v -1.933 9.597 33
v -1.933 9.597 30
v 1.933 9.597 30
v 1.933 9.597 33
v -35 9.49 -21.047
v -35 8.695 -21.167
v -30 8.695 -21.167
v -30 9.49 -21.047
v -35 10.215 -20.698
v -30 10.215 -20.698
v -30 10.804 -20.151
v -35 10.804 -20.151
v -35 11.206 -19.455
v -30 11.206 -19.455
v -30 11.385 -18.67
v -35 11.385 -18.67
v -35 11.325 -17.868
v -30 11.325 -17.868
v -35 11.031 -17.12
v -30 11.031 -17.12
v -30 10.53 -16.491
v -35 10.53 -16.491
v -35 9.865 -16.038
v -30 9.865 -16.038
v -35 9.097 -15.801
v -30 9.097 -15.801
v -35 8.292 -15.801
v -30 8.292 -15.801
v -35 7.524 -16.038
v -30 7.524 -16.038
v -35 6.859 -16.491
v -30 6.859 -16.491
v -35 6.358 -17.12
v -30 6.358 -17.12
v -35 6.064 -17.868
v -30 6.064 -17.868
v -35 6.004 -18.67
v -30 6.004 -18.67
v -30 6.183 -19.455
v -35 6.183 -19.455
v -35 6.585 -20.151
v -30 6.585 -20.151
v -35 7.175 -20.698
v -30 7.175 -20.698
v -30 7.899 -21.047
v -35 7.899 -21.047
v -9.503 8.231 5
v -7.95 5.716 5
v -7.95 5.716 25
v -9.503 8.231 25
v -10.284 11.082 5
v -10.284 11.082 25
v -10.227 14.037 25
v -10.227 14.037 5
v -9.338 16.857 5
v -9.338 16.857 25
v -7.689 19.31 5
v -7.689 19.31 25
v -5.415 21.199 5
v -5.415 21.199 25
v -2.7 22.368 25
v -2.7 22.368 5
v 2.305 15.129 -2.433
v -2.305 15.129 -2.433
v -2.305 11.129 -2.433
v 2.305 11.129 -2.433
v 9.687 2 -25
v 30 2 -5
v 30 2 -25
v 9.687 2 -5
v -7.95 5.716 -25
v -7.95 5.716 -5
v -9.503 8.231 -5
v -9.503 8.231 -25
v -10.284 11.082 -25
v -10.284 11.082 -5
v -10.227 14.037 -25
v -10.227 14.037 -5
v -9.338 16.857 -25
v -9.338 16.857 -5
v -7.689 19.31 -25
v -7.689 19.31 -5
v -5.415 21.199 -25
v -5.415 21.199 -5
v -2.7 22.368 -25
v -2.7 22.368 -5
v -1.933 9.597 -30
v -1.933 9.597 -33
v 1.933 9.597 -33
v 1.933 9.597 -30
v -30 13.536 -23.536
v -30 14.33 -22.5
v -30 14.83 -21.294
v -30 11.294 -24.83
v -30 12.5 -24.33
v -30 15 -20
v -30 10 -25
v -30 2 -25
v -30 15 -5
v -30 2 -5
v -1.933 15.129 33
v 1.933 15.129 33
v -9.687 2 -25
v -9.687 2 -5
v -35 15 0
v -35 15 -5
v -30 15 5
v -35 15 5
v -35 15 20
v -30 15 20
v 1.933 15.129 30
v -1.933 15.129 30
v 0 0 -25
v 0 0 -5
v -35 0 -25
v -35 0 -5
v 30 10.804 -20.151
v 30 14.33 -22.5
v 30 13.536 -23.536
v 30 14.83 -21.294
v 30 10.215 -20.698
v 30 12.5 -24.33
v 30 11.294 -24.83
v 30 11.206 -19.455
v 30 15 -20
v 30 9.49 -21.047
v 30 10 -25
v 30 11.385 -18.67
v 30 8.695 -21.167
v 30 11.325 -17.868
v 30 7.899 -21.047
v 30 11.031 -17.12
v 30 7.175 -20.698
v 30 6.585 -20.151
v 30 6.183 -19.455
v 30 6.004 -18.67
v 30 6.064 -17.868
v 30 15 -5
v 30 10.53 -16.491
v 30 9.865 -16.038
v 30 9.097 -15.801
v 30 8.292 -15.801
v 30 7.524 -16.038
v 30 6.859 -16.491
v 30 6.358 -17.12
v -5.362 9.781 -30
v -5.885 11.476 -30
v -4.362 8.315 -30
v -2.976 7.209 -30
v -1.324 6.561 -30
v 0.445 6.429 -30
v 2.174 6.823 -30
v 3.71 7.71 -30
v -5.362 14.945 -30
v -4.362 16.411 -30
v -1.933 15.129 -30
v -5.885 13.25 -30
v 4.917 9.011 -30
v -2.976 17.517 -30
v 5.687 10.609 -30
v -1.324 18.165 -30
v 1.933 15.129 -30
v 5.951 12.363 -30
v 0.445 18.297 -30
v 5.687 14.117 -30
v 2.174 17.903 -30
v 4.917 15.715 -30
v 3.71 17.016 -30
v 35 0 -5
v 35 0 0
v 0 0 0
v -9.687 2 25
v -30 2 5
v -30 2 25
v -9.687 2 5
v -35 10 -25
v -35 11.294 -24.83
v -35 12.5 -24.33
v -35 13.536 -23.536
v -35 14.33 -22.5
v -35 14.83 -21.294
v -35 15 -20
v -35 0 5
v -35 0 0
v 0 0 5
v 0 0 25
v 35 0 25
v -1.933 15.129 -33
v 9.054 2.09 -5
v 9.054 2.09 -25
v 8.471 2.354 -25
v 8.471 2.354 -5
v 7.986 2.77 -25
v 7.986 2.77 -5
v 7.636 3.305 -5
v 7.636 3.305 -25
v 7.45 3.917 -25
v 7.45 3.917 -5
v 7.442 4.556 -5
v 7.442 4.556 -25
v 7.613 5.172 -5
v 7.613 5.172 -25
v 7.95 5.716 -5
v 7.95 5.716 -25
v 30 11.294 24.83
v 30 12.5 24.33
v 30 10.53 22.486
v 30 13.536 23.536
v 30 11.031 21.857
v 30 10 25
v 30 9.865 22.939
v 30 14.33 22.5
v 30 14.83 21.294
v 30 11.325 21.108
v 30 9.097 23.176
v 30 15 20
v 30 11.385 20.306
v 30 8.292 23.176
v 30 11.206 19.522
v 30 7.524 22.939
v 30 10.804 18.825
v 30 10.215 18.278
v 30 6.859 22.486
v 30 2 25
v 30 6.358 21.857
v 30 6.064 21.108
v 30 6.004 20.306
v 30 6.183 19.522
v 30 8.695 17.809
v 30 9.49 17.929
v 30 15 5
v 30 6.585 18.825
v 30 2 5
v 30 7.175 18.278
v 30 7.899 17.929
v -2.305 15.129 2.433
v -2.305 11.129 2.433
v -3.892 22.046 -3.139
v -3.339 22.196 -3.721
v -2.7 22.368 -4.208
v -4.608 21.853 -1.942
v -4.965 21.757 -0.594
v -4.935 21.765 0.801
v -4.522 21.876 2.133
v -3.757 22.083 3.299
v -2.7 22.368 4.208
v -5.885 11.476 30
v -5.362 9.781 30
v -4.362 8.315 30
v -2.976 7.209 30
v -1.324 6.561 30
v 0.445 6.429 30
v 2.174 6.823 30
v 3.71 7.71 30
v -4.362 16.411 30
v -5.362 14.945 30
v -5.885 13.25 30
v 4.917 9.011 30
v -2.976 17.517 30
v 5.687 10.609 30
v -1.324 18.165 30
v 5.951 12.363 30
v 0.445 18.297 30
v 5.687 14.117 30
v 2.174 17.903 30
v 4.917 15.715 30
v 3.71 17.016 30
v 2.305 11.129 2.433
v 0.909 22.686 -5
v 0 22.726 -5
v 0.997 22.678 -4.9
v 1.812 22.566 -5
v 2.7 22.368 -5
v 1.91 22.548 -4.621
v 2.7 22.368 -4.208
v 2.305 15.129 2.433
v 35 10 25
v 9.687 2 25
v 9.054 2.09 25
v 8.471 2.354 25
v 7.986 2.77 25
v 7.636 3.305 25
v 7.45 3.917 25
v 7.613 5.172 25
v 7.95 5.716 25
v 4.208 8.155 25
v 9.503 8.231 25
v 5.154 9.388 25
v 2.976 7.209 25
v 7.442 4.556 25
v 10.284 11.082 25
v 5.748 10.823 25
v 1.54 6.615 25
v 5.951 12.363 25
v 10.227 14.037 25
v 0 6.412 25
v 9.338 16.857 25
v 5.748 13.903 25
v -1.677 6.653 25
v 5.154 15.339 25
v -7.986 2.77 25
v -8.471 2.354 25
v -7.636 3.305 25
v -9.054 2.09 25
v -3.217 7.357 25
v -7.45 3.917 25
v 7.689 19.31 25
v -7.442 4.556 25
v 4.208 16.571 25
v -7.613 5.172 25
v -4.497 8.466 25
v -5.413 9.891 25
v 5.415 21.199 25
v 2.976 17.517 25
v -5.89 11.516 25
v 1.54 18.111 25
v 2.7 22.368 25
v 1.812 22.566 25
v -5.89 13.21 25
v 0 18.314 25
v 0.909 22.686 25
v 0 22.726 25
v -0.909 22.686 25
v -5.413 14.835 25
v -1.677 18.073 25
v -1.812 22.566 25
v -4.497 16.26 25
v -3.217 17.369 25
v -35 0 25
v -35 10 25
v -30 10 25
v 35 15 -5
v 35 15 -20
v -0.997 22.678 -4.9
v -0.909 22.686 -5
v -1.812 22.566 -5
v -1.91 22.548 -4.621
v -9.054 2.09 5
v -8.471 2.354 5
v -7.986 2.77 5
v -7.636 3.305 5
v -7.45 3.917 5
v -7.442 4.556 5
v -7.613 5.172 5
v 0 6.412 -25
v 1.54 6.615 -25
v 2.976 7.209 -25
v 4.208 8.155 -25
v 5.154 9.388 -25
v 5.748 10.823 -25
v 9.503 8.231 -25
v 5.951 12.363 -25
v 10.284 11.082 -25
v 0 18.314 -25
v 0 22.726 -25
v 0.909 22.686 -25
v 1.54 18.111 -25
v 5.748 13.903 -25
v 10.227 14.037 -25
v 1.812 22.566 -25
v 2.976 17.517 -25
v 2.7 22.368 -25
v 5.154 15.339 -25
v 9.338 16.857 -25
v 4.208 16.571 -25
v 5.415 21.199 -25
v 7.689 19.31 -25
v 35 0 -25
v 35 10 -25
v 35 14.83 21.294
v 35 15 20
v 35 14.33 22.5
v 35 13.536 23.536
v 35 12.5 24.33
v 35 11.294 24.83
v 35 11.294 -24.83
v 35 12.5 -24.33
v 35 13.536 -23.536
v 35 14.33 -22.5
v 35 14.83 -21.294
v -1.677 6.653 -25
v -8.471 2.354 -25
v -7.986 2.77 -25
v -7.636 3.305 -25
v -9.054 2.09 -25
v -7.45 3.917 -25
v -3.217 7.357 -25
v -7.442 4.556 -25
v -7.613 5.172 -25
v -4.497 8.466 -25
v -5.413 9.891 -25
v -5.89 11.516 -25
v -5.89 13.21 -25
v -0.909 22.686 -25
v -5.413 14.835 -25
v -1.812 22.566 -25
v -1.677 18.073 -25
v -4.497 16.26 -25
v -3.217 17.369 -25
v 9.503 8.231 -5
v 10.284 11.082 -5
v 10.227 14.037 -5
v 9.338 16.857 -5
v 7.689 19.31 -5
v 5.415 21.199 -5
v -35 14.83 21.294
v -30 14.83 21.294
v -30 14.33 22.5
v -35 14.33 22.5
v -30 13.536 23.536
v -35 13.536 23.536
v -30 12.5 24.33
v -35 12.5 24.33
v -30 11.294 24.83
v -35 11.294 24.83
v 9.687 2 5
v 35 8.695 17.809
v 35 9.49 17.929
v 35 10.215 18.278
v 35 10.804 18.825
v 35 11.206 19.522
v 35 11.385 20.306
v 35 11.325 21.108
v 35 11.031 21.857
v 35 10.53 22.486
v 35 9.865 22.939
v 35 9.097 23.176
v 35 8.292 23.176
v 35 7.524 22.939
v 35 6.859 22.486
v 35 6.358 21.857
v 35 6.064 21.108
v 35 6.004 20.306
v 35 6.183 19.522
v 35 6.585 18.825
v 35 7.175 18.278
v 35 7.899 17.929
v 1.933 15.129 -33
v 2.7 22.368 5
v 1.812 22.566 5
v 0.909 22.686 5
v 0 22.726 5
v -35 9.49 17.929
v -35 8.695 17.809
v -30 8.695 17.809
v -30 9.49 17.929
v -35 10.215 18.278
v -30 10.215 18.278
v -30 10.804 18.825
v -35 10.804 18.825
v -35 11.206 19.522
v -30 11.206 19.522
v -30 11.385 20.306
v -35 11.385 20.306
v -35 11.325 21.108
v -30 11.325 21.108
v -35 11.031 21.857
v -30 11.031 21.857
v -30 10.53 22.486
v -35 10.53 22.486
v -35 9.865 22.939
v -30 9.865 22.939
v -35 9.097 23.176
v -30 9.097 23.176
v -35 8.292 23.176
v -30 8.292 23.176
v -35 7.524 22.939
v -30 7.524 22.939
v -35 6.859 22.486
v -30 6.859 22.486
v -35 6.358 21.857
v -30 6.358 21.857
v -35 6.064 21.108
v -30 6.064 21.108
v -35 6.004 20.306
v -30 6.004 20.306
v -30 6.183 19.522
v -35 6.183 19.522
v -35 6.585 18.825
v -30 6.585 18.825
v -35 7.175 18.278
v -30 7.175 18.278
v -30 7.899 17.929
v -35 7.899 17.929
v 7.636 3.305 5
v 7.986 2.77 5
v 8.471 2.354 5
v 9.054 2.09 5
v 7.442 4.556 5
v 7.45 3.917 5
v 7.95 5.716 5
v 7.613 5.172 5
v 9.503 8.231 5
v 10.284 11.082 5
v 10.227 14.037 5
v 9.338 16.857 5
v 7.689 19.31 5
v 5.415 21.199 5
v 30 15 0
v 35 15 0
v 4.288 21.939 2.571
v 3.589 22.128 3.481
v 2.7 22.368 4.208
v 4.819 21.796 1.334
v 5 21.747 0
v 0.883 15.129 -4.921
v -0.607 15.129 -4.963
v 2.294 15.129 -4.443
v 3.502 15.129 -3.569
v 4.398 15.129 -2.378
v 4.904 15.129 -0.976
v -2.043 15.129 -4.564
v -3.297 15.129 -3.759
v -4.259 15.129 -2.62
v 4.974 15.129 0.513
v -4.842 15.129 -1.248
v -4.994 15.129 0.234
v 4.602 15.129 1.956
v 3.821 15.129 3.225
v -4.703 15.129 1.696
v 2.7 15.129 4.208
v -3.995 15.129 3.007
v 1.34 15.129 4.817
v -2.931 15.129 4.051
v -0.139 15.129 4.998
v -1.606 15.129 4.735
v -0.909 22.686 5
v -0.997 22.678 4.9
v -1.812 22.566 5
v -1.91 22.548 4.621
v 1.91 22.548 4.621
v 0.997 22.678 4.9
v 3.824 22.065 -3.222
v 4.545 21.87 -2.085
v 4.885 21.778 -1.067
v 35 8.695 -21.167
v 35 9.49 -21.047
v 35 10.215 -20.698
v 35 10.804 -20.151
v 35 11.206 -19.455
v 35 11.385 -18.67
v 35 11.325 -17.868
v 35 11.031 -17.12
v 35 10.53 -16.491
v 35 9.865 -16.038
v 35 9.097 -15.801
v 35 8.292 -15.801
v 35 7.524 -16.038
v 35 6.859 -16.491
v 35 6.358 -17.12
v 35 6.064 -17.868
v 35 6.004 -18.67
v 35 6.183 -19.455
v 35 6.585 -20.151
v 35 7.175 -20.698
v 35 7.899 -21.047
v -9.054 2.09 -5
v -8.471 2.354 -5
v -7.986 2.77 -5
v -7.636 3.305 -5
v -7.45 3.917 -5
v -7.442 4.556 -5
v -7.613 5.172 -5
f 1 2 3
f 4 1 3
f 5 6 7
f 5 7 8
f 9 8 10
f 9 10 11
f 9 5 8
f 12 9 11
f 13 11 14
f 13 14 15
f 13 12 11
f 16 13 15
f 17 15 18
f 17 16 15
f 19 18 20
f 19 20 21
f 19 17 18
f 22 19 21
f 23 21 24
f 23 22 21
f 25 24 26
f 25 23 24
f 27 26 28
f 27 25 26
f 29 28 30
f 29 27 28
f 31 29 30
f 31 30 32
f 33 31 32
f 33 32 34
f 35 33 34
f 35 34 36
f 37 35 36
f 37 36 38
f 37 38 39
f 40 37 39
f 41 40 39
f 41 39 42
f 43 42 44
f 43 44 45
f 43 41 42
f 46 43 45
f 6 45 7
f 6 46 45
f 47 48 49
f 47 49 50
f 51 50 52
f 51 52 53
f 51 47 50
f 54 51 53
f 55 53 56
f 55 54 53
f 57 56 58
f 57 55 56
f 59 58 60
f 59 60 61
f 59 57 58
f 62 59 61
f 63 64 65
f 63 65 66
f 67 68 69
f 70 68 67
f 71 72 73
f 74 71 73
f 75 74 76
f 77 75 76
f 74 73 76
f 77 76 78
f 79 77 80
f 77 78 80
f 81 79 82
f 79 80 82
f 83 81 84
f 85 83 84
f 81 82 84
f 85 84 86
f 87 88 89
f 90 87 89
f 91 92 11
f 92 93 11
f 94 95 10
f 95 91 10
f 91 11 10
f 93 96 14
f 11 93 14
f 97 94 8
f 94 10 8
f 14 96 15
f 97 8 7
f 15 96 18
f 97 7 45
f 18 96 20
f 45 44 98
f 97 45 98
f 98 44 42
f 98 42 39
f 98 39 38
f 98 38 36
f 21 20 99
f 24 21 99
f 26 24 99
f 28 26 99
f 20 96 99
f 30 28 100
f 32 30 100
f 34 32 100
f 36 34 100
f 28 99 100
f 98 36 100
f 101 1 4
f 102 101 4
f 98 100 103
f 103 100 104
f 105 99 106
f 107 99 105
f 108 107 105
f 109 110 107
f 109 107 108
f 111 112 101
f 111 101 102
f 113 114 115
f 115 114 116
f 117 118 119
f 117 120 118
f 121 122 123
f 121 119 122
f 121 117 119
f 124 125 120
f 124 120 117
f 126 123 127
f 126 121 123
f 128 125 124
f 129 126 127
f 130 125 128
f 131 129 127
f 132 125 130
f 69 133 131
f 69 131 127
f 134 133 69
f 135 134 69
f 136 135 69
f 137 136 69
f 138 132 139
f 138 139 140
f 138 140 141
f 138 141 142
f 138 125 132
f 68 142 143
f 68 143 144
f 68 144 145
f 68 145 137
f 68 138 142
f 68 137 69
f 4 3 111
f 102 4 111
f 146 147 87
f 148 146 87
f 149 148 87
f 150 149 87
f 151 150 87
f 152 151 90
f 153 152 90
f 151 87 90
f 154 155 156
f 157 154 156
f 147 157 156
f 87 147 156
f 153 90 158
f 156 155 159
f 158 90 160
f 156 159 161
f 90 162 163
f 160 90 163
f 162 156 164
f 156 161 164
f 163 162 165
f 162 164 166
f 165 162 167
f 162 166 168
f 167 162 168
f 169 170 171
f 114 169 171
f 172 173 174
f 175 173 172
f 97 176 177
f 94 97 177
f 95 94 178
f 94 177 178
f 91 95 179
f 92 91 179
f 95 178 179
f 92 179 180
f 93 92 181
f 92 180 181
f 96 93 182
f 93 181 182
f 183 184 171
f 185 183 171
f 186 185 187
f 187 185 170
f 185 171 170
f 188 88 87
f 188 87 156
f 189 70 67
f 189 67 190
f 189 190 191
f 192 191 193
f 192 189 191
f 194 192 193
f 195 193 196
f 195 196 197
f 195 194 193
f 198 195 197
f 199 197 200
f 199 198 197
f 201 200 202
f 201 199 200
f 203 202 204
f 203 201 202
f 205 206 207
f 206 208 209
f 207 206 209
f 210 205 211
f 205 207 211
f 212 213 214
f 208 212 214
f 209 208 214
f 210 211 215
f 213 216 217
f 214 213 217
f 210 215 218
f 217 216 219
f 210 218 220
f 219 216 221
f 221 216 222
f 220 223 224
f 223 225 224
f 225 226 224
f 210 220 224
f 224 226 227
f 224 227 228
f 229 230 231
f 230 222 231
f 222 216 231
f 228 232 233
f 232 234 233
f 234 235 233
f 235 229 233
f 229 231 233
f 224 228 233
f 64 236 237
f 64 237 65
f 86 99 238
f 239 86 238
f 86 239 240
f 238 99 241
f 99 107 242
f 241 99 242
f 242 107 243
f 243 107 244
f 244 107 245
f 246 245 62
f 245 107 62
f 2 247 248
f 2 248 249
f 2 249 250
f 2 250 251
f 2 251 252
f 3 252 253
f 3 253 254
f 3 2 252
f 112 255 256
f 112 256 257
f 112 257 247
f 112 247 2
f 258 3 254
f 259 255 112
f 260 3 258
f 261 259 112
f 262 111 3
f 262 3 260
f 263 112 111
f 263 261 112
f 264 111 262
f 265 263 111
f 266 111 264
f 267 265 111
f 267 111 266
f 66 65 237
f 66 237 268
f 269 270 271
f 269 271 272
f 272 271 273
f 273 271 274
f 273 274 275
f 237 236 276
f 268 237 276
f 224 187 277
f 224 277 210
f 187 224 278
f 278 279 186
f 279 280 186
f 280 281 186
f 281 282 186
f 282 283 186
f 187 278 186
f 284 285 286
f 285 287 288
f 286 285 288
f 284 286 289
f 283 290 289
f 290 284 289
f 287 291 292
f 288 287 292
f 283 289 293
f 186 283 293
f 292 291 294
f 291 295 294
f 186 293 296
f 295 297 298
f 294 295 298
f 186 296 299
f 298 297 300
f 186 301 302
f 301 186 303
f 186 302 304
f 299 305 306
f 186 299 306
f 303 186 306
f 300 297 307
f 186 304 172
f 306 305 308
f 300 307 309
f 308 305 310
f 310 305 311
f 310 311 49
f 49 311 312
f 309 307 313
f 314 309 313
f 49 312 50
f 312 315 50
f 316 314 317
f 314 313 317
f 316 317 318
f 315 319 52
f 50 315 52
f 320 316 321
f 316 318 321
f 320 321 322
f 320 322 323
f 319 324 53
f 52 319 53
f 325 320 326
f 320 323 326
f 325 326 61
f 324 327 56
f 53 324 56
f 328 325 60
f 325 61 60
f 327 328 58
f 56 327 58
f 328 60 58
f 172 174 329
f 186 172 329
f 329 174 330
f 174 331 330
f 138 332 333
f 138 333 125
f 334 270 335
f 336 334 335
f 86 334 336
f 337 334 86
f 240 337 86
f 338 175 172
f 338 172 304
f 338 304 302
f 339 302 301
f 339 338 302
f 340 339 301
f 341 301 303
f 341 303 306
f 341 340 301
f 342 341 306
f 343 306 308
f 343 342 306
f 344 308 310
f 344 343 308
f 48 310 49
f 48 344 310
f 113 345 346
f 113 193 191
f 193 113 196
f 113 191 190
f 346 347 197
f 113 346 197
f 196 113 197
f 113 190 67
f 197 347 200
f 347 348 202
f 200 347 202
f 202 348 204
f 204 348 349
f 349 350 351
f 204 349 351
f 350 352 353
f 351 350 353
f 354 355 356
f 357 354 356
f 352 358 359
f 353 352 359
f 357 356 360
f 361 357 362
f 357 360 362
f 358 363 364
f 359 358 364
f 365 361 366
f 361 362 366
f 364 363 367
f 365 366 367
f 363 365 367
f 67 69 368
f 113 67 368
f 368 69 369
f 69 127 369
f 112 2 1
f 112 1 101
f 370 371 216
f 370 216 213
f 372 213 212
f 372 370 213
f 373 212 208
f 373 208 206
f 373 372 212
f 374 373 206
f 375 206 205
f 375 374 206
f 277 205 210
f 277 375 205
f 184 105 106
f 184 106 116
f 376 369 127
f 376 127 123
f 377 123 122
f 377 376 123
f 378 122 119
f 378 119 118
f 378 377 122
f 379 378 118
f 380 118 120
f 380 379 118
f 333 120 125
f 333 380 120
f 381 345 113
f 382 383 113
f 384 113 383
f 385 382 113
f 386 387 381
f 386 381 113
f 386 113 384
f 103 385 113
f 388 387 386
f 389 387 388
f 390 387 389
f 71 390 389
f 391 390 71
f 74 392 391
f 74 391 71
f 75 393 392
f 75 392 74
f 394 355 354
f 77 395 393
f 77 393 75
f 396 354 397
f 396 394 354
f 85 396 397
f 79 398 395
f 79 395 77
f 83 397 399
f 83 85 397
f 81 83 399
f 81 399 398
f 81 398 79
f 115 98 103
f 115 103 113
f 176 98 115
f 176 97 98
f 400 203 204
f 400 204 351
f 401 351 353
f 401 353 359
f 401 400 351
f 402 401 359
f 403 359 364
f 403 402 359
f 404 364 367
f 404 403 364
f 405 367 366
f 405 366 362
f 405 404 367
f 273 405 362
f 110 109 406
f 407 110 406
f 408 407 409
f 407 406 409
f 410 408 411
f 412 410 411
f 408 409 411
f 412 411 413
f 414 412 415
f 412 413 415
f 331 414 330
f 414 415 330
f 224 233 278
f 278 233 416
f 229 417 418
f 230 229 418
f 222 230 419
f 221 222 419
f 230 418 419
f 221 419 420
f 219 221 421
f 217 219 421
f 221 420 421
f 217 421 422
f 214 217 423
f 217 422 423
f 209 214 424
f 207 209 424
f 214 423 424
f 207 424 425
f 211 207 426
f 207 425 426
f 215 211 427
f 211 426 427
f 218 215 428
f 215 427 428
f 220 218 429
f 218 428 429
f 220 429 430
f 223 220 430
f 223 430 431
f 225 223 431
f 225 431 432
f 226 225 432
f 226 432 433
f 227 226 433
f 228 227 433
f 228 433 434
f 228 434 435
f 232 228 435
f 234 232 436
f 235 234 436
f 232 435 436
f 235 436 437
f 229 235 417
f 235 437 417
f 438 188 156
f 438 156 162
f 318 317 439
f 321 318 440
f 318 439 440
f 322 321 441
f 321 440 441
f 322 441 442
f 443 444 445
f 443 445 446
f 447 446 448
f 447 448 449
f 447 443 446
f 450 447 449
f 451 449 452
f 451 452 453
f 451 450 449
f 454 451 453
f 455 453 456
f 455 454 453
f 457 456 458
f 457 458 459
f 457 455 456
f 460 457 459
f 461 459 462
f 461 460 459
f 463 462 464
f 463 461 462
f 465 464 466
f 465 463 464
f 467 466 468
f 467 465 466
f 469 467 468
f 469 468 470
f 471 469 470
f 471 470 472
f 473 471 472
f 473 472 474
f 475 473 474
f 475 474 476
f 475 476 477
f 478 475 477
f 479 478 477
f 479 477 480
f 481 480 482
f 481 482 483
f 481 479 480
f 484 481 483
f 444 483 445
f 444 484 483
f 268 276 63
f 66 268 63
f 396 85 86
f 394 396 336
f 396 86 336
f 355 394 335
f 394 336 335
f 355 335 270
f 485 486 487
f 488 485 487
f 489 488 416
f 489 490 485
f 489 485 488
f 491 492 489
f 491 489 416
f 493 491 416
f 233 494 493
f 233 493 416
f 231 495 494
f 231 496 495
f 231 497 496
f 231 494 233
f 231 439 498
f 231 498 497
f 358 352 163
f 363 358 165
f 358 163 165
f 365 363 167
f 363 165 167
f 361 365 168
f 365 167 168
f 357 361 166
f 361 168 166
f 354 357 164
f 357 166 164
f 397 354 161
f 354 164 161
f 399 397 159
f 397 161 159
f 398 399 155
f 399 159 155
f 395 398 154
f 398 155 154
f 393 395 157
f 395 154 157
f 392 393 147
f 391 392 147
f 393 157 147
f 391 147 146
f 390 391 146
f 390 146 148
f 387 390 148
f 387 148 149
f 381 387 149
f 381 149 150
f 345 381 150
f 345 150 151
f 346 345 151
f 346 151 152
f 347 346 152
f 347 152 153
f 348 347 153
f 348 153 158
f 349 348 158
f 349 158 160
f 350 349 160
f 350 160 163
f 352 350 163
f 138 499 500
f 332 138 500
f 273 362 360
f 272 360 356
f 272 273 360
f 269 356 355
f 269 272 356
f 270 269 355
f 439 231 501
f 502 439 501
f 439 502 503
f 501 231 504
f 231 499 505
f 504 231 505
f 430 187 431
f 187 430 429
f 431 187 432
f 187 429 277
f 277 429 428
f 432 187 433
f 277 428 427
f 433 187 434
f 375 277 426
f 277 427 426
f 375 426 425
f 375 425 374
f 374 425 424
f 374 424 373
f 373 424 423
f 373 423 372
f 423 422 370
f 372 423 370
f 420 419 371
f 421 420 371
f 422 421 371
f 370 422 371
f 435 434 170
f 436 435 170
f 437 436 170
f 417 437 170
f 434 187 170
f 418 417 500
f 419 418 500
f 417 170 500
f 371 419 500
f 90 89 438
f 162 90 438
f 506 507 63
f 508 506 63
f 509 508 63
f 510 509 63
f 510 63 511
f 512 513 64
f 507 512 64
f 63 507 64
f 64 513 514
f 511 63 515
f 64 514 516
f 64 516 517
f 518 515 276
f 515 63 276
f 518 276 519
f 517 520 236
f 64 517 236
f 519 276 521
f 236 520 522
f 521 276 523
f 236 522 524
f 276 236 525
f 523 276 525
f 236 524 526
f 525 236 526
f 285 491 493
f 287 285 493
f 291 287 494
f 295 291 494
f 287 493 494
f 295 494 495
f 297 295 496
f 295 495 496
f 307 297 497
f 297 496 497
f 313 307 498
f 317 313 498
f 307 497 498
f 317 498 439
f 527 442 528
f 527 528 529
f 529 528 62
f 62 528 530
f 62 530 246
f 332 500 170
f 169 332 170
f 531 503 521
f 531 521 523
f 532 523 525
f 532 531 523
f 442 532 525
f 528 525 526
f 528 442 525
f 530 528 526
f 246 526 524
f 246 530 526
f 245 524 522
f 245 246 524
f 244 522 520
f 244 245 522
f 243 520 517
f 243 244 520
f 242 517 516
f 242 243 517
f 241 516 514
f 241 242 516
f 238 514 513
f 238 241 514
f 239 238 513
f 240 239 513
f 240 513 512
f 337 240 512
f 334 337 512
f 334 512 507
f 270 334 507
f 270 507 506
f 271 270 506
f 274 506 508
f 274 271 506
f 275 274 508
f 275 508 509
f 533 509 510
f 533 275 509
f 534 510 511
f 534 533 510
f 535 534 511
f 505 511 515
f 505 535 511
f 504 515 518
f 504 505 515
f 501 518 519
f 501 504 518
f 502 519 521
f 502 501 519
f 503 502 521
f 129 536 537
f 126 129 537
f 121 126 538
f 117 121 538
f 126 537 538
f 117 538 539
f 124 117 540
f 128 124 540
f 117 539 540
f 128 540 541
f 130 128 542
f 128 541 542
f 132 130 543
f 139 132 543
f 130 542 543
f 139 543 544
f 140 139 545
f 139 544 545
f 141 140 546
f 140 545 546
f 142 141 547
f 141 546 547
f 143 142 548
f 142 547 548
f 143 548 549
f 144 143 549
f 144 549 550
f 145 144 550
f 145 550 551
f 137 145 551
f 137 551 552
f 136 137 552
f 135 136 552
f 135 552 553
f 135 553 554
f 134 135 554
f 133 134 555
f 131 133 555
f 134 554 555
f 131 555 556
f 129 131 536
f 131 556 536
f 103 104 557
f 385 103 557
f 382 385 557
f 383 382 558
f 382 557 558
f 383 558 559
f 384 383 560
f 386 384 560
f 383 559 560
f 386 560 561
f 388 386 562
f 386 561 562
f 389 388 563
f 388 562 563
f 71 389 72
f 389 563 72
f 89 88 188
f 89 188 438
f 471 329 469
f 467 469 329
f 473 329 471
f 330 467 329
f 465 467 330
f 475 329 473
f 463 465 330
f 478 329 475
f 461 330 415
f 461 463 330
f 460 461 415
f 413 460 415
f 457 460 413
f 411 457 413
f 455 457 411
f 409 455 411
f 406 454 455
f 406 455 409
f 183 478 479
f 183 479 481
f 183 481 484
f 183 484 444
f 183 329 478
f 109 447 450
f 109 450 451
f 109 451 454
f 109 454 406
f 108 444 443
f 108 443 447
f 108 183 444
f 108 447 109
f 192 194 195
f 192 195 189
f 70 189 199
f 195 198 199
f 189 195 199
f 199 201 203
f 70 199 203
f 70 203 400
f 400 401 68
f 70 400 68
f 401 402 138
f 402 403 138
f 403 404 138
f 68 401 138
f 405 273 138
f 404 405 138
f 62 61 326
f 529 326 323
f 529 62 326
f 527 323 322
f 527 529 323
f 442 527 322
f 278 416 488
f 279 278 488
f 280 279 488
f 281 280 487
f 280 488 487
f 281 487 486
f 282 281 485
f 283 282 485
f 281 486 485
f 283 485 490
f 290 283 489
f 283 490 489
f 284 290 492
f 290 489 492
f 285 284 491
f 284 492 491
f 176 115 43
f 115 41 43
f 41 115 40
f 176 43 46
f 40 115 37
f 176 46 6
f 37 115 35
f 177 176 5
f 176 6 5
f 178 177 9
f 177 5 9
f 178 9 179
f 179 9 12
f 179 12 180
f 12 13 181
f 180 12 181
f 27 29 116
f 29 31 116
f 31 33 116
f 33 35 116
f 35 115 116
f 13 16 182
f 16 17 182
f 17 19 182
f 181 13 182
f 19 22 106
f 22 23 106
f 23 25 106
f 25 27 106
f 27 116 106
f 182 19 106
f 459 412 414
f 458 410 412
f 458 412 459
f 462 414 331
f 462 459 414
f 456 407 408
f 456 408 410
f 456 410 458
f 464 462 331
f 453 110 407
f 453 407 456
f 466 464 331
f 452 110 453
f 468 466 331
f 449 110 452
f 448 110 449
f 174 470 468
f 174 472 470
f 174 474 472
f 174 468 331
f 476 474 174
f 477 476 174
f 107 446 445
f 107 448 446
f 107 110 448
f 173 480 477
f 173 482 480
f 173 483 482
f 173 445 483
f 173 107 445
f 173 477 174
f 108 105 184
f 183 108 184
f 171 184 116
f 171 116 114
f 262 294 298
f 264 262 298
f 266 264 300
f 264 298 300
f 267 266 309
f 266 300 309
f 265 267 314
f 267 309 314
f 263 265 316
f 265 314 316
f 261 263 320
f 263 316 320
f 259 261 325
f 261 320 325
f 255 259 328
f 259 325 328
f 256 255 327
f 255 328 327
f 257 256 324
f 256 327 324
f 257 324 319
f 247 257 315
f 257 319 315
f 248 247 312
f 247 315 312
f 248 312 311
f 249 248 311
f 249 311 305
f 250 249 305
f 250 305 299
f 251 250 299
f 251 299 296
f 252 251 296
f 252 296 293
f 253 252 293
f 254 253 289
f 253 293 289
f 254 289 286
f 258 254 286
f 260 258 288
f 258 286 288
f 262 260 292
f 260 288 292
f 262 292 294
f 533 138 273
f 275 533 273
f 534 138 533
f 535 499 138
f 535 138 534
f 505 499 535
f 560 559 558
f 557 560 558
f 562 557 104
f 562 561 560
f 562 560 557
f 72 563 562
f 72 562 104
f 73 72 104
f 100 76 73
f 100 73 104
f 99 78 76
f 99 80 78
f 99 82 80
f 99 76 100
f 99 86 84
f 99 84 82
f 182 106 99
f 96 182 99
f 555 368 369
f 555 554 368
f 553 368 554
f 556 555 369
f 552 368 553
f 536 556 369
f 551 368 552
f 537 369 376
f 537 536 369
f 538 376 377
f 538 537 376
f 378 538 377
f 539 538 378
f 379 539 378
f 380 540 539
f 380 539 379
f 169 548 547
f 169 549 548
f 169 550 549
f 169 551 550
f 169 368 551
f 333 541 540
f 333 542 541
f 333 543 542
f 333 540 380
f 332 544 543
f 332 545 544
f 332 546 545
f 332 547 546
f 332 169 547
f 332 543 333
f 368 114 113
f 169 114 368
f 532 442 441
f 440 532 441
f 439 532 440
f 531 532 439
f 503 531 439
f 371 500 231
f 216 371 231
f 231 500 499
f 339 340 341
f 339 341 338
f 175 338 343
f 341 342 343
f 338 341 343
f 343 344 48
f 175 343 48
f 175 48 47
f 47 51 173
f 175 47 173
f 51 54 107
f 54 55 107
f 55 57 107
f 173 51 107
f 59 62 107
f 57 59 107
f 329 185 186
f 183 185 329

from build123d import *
from build123d.topology import SkipClean

# Parameters (mm, degrees)
BOSS_EXTRUDE1_DEPTH      = 5
BOSS_EXTRUDE2_DEPTH      = 20
MIRROR3_COPY_1_DEPTH     = 5
MIRROR3_COPY_2_DEPTH     = 20
SKETCH4_R                = 2.698355907
CUT_EXTRUDE1_DEPTH       = 5
BOSS_EXTRUDE3_DEPTH      = 5
BOSS_EXTRUDE3_DEPTH_BACK = 55
SKETCH8_R                = 5.951026126
SKETCH8_W                = 3.866122338
SKETCH8_H                = 5.532358837
BOSS_EXTRUDE5_DEPTH      = 3
BOSS_EXTRUDE5_DEPTH_BACK = 63
SKETCH10_W               = 3.866122338
SKETCH10_H               = 5.532358837
SKETCH12_R               = 5
CUT_EXTRUDE3_DEPTH       = 7.59683428
SKETCH14_W               = 4.609426796
SKETCH14_H               = 4.865506062
CUT_EXTRUDE6_DEPTH       = 4


with BuildPart() as part:
    # Sketch1 → Boss-Extrude1 (new body)
    with BuildSketch(Plane.XY):
        with BuildLine():
            Line((30, 2), (30, 15))
            Line((30, 15), (2.700298335, 22.368034529))
            ThreePointArc((2.700298335, 22.368034529), (9.883500212, 15.478856519), (7.950094011, 5.715603818))
            ThreePointArc((7.950094011, 5.715603818), (7.635951646, 3.305180914), (9.686640989, 2))
            Line((9.686640989, 2), (30, 2))
        make_face()
        with BuildLine():
            ThreePointArc((7.950094011, 5.715603818), (7.635951646, 3.305180914), (9.686640989, 2))
            Line((9.686640989, 2), (30, 2))
            Line((30, 2), (30, 15))
            Line((30, 15), (35, 15))
            Line((35, 15), (35, 0))
            Line((35, 0), (0, 0))
            Line((0, 0), (0, 2))
            Line((0, 2), (0, 6.411987573))
            ThreePointArc((0, 6.411987573), (5.951026126, 12.363013699), (0, 18.314039825))
            Line((0, 18.314039825), (0, 22.726027397))
            ThreePointArc((0, 22.726027397), (9.388270676, 16.750772424), (7.950094011, 5.715603818))
        make_face()
    boss_extrude1 = extrude(amount=BOSS_EXTRUDE1_DEPTH)

    # Sketch3 → Boss-Extrude2 (add)
    with BuildSketch(Plane.XY.offset(5)):
        with BuildLine():
            ThreePointArc((7.950094011, 5.715603818), (9.883500212, 15.478856519), (2.700298335, 22.368034529))
            ThreePointArc((2.700298335, 22.368034529), (1.361962737, 22.636139339), (0, 22.726027397))
            Line((0, 22.726027397), (0, 18.314039825))
            ThreePointArc((0, 18.314039825), (5.951026126, 12.363013699), (0, 6.411987573))
            Line((0, 6.411987573), (0, 2))
            Line((0, 2), (0, 0))
            Line((0, 0), (35, 0))
            Line((35, 0), (35, 15))
            Line((35, 15), (30, 15))
            Line((30, 15), (30, 2))
            Line((30, 2), (9.686640989, 2))
            ThreePointArc((9.686640989, 2), (7.635951646, 3.305180914), (7.950094011, 5.715603818))
        make_face()
    boss_extrude2 = extrude(amount=BOSS_EXTRUDE2_DEPTH)

    # Mirror2: Boss-Extrude1, Boss-Extrude2 across plane
    add(boss_extrude1.mirror(Plane.ZY))
    add(boss_extrude2.mirror(Plane.ZY))

    # Mirror3: Boss-Extrude1, Boss-Extrude2 across Front Plane
    with SkipClean():  # the faces are left unmerged after this step: merging them gives an invalid solid
        add(boss_extrude1.mirror(Plane.XY))
        add(boss_extrude2.mirror(Plane.XY))

    # Mirror3 copy 1 sketch → Mirror3 copy 1 (add)
    with BuildSketch(Plane(origin=(0, 0, 0), x_dir=(-1, 0, 0), z_dir=(0, 0, -1))):
        with BuildLine():
            Line((30, 2), (30, 15))
            Line((30, 15), (2.700298335, 22.368034529))
            ThreePointArc((2.700298335, 22.368034529), (9.883500212, 15.478856519), (7.950094011, 5.715603818))
            ThreePointArc((7.950094011, 5.715603818), (7.635951646, 3.305180914), (9.686640989, 2))
            Line((9.686640989, 2), (30, 2))
        make_face()
        with BuildLine():
            ThreePointArc((7.950094011, 5.715603818), (7.635951646, 3.305180914), (9.686640989, 2))
            Line((9.686640989, 2), (30, 2))
            Line((30, 2), (30, 15))
            Line((30, 15), (35, 15))
            Line((35, 15), (35, 0))
            Line((35, 0), (0, 0))
            Line((0, 0), (0, 2))
            Line((0, 2), (0, 6.411987573))
            ThreePointArc((0, 6.411987573), (5.951026126, 12.363013699), (0, 18.314039825))
            Line((0, 18.314039825), (0, 22.726027397))
            ThreePointArc((0, 22.726027397), (9.388270676, 16.750772424), (7.950094011, 5.715603818))
        make_face()
    extrude(amount=MIRROR3_COPY_1_DEPTH)

    # Mirror3 copy 2 sketch → Mirror3 copy 2 (add)
    with SkipClean():  # the faces are left unmerged after this step: merging them gives an invalid solid
        with BuildSketch(Plane(origin=(0, 0, -5), x_dir=(-1, 0, 0), z_dir=(0, 0, -1))):
            with BuildLine():
                ThreePointArc((7.950094011, 5.715603818), (9.883500212, 15.478856519), (2.700298335, 22.368034529))
                ThreePointArc((2.700298335, 22.368034529), (1.361962737, 22.636139339), (0, 22.726027397))
                Line((0, 22.726027397), (0, 18.314039825))
                ThreePointArc((0, 18.314039825), (5.951026126, 12.363013699), (0, 6.411987573))
                Line((0, 6.411987573), (0, 2))
                Line((0, 2), (0, 0))
                Line((0, 0), (35, 0))
                Line((35, 0), (35, 15))
                Line((35, 15), (30, 15))
                Line((30, 15), (30, 2))
                Line((30, 2), (9.686640989, 2))
                ThreePointArc((9.686640989, 2), (7.635951646, 3.305180914), (7.950094011, 5.715603818))
            make_face()
        extrude(amount=MIRROR3_COPY_2_DEPTH)

    # Sketch4 → Cut-Extrude1 (cut)
    with SkipClean():  # the faces are left unmerged after this step: merging them gives an invalid solid
        with BuildSketch(Plane(origin=(35, 0, 0), x_dir=(0, 0, -1), z_dir=(1, 0, 0))):
            with Locations((-20.507504892, 8.694639524)):
                Circle(SKETCH4_R)
            with Locations((18.468747096, 8.694639524)):
                Circle(SKETCH4_R)
            with BuildLine():
                Line((-25, 10), (-27.403303321, 11.153141573))
                Line((-27.403303321, 11.153141573), (-26.20165166, 17.389341891))
                Line((-26.20165166, 17.389341891), (-20, 16.194347401))
                Line((-20, 16.194347401), (-20, 15))
                ThreePointArc((-20, 15), (-23.535533906, 13.535533906), (-25, 10))
            make_face()
            with BuildLine():
                Line((20, 15), (20.74735875, 17.389341891))
                Line((20.74735875, 17.389341891), (31.360891984, 16.194670945))
                Line((31.360891984, 16.194670945), (27.103485998, 9.174347241))
                Line((27.103485998, 9.174347241), (25, 10))
                ThreePointArc((25, 10), (23.535533906, 13.535533906), (20, 15))
            make_face()
        cut_extrude1 = extrude(amount=-CUT_EXTRUDE1_DEPTH, mode=Mode.SUBTRACT)

    # Mirror4: Cut-Extrude1 across plane
    with SkipClean():  # the faces are left unmerged after this step: merging them gives an invalid solid
        add(cut_extrude1.mirror(Plane.ZY), mode=Mode.SUBTRACT)

    # Sketch8 → Boss-Extrude3 (add, two sides: drawn at the far end of the back side and taken through both)
    with SkipClean():  # the faces are left unmerged after this step: merging them gives an invalid solid
        with BuildSketch(Plane.XY.offset(25).offset(-BOSS_EXTRUDE3_DEPTH_BACK)):
            with Locations((0, 12.363013699)):
                Circle(SKETCH8_R)
            with Locations((0, 12.363013699)):
                Rectangle(SKETCH8_W, SKETCH8_H, mode=Mode.SUBTRACT)
        extrude(amount=BOSS_EXTRUDE3_DEPTH + BOSS_EXTRUDE3_DEPTH_BACK)

    # Sketch10 → Boss-Extrude5 (add, two sides: drawn at the far end of the back side and taken through both)
    with SkipClean():  # the faces are left unmerged after this step: merging them gives an invalid solid
        with BuildSketch(Plane.XY.offset(30).offset(-BOSS_EXTRUDE5_DEPTH_BACK)):
            with Locations((0, 12.363013699)):
                Rectangle(SKETCH10_W, SKETCH10_H)
        extrude(amount=BOSS_EXTRUDE5_DEPTH + BOSS_EXTRUDE5_DEPTH_BACK)

    # Sketch12 → Cut-Extrude3 (cut)
    with SkipClean():  # the faces are left unmerged after this step: merging them gives an invalid solid
        with BuildSketch(Plane.XZ.offset(-22.726027397)):
            with Locations(Location((0, 0, 0), (0, 0, 57.312299274))):
                Circle(SKETCH12_R)
        extrude(amount=CUT_EXTRUDE3_DEPTH, mode=Mode.SUBTRACT)

    # Sketch14 → Cut-Extrude6 (cut, symmetric)
    with SkipClean():  # the faces are left unmerged after this step: merging them gives an invalid solid
        with BuildSketch(Plane(origin=(0, 15.129193117, 0), x_dir=(1, 0, 0), z_dir=(0, 1, 0))):
            Rectangle(SKETCH14_W, SKETCH14_H)
        extrude(amount=CUT_EXTRUDE6_DEPTH, both=True, mode=Mode.SUBTRACT)


solid = part.part
